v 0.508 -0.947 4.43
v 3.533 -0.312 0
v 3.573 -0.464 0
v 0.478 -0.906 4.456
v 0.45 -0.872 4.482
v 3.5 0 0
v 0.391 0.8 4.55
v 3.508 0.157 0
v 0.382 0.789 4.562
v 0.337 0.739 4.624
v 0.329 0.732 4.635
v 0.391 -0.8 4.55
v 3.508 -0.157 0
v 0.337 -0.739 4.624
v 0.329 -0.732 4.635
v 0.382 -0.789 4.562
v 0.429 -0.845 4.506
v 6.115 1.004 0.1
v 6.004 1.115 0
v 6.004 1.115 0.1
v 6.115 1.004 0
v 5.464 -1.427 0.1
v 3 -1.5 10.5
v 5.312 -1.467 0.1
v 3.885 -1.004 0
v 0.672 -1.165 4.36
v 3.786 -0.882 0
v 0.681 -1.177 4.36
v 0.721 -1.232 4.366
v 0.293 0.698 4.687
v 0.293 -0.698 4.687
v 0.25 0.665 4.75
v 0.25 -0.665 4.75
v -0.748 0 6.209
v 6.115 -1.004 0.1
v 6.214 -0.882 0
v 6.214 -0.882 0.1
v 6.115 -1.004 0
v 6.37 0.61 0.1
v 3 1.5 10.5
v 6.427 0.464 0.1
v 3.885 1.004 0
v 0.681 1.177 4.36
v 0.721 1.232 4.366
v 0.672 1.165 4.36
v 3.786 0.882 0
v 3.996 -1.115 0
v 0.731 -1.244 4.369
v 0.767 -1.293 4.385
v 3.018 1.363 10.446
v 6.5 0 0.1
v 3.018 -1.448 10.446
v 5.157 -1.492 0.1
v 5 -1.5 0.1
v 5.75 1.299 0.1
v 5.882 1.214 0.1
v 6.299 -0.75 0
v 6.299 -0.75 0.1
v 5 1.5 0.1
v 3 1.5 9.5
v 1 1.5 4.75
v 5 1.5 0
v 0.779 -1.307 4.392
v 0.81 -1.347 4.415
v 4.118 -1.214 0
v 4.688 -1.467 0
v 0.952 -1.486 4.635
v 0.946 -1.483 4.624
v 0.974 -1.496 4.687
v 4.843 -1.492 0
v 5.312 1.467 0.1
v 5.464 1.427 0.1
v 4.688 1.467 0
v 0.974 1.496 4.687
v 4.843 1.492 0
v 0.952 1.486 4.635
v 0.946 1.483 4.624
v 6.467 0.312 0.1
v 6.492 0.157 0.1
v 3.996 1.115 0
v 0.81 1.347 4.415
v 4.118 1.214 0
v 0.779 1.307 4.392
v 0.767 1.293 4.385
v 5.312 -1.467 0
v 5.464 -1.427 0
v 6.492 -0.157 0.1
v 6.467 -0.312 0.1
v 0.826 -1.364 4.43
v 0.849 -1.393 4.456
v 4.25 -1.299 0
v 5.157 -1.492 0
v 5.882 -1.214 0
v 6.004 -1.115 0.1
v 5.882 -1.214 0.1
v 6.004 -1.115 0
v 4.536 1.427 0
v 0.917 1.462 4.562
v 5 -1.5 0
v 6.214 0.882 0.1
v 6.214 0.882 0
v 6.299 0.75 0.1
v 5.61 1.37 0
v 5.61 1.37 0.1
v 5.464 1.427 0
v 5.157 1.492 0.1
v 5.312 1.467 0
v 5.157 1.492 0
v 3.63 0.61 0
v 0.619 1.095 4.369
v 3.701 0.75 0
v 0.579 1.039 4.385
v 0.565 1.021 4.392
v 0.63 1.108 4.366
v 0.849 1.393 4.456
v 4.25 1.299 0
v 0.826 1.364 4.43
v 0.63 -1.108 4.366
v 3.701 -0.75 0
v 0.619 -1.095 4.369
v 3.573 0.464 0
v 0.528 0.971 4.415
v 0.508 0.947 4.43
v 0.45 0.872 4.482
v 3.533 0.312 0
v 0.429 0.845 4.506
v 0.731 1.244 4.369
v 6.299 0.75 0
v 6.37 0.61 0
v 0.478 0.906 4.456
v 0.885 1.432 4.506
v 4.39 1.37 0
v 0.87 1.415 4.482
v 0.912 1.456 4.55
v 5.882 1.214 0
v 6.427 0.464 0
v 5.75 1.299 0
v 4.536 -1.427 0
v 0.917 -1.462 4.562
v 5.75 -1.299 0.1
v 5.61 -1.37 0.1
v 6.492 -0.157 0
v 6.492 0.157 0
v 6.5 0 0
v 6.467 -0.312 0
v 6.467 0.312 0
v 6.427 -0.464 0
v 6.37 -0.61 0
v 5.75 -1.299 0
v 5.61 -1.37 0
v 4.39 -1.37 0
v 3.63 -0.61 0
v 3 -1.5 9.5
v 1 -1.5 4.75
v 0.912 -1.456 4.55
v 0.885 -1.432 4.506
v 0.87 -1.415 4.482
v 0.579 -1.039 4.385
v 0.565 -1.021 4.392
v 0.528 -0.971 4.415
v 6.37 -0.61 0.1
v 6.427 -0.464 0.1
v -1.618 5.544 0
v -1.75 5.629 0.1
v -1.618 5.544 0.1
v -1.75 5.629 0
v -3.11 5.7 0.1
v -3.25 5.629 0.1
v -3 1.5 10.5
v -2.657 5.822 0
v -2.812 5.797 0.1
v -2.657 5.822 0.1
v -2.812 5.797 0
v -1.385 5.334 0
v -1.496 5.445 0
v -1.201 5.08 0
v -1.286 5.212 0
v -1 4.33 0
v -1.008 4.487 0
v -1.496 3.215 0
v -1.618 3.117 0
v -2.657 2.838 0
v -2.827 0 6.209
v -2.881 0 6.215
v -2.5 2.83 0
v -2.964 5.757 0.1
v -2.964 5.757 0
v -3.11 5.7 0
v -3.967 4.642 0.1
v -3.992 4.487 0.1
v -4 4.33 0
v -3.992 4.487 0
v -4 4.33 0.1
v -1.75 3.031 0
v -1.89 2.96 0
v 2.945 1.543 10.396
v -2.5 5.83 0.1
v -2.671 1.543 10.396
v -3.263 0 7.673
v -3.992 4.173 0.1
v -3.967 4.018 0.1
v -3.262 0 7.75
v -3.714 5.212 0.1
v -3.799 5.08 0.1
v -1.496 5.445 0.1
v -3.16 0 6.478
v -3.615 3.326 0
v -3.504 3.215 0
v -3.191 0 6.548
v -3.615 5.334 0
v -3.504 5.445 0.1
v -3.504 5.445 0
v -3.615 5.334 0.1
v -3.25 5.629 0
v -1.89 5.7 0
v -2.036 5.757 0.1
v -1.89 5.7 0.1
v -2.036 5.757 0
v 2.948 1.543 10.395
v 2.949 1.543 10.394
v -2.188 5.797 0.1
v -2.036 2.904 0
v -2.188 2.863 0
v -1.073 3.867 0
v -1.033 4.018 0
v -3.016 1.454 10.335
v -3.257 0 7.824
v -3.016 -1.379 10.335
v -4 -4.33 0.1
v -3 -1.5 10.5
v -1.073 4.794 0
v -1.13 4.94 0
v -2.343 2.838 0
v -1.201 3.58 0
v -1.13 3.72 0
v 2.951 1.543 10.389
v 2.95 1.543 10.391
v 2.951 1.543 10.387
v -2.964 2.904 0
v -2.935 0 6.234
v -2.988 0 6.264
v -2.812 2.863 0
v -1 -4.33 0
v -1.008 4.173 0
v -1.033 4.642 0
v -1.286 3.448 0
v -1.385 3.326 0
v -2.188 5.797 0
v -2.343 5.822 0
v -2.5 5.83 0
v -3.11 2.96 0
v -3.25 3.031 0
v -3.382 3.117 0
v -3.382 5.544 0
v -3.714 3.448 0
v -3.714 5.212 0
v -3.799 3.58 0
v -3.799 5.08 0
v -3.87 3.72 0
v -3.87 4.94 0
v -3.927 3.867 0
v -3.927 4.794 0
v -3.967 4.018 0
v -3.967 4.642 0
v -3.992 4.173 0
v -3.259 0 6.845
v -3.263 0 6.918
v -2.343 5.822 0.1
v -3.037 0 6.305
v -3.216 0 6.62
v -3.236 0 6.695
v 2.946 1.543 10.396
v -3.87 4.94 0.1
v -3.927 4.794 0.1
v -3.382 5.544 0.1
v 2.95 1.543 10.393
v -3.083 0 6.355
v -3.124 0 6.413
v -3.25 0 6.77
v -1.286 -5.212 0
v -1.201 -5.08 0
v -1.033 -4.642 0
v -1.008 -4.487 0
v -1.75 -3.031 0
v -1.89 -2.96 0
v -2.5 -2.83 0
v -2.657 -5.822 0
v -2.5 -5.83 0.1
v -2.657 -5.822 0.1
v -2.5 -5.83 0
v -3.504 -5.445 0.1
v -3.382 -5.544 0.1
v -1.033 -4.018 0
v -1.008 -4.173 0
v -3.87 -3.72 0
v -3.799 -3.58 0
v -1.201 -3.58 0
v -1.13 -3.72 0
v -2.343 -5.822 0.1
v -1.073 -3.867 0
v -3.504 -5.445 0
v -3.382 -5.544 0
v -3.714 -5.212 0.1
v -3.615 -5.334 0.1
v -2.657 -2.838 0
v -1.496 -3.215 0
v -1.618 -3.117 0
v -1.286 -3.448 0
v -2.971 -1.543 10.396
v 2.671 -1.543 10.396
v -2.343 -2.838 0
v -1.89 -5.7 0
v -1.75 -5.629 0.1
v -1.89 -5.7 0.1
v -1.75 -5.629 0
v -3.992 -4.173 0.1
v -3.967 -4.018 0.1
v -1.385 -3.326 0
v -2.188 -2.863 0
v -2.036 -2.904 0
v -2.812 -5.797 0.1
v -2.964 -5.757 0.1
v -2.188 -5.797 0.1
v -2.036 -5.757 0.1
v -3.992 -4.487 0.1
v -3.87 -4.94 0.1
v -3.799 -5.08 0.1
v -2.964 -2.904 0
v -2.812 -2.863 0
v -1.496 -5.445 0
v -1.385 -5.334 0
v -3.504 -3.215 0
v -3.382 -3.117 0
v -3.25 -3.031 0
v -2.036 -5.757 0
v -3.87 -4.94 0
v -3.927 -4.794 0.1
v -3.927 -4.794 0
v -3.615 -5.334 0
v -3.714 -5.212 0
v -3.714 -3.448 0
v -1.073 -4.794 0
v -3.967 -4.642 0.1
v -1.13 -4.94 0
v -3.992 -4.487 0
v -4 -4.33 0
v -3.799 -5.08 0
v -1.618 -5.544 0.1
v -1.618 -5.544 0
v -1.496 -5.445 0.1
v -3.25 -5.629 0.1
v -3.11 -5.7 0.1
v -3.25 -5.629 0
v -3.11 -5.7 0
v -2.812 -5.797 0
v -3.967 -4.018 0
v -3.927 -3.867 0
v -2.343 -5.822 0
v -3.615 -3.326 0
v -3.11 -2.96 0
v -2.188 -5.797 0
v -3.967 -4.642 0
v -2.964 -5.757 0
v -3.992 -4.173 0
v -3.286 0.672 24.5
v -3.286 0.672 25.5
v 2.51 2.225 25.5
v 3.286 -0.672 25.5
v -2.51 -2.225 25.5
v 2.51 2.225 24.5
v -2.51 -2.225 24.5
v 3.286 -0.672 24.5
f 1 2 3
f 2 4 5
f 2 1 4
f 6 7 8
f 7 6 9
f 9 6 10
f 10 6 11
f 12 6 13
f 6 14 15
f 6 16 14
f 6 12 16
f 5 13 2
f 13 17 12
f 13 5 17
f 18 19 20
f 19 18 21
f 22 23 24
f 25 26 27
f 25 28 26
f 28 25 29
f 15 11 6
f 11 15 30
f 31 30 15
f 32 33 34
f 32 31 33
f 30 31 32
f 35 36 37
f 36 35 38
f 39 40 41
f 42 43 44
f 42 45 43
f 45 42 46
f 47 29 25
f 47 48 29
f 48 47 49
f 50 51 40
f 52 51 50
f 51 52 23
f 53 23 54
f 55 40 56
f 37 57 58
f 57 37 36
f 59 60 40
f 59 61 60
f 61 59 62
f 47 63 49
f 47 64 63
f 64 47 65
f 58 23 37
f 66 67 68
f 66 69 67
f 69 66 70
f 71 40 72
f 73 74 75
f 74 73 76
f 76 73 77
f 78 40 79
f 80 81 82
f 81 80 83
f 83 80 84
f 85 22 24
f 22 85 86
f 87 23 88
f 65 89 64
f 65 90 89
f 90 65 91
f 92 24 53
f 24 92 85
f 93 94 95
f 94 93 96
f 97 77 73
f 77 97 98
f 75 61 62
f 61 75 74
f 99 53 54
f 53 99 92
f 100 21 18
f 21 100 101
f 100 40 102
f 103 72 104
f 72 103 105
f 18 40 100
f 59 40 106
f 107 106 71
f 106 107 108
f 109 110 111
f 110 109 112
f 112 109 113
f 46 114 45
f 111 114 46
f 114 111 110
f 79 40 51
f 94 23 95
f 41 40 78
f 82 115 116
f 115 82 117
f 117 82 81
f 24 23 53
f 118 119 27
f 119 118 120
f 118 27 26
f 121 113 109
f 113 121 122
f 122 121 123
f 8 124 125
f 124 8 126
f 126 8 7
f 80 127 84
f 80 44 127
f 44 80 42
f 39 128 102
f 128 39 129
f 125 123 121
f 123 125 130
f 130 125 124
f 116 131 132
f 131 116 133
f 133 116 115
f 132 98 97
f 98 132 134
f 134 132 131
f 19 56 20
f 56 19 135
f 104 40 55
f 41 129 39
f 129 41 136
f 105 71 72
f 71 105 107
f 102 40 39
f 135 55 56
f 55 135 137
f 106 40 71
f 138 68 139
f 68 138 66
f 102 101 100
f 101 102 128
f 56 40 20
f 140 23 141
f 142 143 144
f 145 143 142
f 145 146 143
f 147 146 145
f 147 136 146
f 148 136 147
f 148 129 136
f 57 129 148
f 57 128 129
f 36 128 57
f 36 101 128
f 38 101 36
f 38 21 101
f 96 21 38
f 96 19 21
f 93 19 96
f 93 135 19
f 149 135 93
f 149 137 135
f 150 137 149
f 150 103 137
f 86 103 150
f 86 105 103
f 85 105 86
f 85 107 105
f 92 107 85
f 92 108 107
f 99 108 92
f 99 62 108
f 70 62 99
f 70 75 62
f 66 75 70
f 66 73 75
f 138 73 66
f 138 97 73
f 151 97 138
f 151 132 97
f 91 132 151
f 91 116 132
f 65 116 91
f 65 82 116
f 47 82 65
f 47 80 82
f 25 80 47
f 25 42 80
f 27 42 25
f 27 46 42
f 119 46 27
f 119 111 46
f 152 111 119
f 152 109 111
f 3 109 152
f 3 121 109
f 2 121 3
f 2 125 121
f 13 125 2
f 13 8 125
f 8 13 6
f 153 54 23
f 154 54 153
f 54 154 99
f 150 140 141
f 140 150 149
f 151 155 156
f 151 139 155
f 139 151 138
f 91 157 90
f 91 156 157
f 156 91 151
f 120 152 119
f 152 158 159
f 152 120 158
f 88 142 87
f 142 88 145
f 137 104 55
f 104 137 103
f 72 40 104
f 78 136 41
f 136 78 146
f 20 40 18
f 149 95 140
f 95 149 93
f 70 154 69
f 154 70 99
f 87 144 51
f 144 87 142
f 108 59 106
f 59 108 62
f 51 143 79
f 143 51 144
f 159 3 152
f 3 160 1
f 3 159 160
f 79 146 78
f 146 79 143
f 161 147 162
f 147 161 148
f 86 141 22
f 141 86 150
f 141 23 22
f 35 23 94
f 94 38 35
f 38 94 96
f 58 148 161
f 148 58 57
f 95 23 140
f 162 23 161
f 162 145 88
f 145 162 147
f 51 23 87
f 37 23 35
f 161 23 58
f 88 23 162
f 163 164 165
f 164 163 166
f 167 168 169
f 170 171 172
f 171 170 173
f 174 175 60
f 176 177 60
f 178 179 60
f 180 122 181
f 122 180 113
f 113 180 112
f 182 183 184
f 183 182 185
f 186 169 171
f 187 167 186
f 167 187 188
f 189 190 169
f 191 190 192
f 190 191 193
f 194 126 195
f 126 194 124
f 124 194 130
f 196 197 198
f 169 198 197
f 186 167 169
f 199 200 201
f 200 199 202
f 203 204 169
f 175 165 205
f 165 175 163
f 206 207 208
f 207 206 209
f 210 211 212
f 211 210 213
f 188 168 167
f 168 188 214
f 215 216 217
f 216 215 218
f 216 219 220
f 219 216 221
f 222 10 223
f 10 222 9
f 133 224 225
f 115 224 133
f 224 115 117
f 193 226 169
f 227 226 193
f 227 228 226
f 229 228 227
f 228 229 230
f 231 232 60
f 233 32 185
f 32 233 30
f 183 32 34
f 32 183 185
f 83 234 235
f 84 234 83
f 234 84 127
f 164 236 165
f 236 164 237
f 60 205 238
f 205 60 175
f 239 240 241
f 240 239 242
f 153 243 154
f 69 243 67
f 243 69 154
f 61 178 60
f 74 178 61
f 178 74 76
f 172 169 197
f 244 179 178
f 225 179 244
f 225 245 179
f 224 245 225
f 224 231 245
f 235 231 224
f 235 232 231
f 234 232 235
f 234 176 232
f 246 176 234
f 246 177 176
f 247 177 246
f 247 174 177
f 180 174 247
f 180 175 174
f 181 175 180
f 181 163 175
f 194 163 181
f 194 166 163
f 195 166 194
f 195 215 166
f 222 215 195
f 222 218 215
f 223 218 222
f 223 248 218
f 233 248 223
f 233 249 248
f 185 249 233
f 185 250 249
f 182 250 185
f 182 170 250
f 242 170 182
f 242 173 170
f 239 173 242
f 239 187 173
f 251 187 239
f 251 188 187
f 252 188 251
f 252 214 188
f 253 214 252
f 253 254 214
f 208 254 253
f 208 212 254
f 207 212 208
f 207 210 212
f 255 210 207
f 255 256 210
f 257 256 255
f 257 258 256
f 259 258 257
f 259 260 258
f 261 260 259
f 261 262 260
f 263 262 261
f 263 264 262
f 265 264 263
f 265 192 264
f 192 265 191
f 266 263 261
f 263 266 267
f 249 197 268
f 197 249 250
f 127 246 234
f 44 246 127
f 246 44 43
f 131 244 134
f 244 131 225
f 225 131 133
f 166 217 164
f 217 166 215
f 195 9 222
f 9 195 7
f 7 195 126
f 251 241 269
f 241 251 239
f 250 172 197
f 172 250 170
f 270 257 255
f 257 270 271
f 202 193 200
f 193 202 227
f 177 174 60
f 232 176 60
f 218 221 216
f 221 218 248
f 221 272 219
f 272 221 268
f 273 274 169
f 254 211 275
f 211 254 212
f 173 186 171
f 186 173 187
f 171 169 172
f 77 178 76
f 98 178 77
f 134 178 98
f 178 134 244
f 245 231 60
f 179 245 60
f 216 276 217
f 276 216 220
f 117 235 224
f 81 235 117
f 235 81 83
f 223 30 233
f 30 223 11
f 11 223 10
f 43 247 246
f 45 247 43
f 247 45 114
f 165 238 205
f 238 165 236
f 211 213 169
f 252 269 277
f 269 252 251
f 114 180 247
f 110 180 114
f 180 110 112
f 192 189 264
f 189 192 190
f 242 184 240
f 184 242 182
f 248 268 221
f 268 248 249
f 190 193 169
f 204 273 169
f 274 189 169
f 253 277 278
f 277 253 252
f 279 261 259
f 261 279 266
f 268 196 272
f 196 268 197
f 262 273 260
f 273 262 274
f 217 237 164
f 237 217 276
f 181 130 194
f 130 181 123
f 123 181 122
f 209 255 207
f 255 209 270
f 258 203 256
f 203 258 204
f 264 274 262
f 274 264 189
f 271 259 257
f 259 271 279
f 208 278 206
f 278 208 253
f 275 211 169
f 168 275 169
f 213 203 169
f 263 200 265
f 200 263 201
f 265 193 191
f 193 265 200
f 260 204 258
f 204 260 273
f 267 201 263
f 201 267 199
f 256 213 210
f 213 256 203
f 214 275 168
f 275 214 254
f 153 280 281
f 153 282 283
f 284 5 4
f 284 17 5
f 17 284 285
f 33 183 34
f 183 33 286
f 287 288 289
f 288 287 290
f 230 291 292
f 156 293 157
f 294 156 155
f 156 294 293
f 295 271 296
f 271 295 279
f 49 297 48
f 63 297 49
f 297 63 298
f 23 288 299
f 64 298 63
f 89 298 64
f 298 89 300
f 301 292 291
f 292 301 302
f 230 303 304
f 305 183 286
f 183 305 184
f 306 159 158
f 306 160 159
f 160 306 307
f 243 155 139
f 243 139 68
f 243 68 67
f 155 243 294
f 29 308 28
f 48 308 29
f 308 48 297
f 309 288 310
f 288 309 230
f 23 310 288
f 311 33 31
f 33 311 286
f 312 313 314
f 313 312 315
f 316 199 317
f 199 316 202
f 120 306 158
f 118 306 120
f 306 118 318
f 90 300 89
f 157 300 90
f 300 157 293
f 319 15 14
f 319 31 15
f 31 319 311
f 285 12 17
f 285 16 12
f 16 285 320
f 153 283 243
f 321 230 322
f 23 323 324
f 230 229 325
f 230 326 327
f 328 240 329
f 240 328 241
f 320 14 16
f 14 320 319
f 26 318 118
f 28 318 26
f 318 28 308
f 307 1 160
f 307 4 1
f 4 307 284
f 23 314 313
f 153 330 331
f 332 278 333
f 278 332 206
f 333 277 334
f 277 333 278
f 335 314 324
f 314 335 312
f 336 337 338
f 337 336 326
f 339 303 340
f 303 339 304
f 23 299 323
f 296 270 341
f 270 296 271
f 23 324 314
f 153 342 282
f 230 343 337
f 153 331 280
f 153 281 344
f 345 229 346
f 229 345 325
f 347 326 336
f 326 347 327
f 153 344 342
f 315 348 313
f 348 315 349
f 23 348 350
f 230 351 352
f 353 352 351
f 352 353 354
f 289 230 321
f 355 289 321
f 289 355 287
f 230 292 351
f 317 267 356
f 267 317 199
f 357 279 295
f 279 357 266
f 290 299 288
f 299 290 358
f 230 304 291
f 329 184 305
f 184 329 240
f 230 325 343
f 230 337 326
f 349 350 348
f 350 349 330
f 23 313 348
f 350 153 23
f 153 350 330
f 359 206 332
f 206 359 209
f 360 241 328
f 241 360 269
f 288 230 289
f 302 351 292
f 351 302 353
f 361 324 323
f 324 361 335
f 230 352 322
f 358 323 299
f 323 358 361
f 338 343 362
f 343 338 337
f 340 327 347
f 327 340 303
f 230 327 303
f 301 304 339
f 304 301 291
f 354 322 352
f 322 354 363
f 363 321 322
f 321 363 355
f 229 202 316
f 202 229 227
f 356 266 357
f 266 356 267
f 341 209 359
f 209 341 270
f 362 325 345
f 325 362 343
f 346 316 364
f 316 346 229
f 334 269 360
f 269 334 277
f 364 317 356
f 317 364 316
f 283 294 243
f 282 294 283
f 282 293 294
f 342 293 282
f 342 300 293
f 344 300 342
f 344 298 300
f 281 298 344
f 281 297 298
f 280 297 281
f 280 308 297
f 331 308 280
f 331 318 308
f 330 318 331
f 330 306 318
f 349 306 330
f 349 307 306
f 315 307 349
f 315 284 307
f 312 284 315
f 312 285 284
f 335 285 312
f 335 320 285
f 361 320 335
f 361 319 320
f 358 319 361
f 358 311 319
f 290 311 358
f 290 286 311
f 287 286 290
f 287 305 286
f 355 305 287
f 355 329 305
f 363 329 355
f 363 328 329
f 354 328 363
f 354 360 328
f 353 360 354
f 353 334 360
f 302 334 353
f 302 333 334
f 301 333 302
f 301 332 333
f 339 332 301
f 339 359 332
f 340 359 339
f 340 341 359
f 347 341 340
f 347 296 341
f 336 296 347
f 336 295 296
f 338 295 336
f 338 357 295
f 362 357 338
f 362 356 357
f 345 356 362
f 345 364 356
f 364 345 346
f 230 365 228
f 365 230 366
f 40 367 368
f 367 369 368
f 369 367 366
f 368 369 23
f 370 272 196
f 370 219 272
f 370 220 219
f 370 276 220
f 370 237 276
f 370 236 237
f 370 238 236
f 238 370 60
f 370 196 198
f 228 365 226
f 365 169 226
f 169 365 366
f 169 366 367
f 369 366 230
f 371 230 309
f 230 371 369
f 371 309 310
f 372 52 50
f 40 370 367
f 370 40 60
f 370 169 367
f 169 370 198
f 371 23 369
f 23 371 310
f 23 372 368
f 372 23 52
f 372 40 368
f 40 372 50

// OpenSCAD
vt_x=6;
vt_y=3;
max_h=25;
base_h=10;
leg=3;
leg_x=base_h/2;
pad=0.1;
legs=3;
$fn=60;

hull() {
    rotate(15)
    translate([0,0,max_h])
    cube([vt_x,vt_y,1],center=true);
    translate([0,0,base_h])
    cube([vt_x,vt_y,1],center=true);
}

for(i=[0:360/legs:360]) {
    hull() {
        rotate([0,0,i])
        translate([leg_x,0,0])
        cylinder(d=leg,h=pad);
        translate([0,0,base_h])
        cube([vt_x,vt_y,1],center=true);
    }
}
